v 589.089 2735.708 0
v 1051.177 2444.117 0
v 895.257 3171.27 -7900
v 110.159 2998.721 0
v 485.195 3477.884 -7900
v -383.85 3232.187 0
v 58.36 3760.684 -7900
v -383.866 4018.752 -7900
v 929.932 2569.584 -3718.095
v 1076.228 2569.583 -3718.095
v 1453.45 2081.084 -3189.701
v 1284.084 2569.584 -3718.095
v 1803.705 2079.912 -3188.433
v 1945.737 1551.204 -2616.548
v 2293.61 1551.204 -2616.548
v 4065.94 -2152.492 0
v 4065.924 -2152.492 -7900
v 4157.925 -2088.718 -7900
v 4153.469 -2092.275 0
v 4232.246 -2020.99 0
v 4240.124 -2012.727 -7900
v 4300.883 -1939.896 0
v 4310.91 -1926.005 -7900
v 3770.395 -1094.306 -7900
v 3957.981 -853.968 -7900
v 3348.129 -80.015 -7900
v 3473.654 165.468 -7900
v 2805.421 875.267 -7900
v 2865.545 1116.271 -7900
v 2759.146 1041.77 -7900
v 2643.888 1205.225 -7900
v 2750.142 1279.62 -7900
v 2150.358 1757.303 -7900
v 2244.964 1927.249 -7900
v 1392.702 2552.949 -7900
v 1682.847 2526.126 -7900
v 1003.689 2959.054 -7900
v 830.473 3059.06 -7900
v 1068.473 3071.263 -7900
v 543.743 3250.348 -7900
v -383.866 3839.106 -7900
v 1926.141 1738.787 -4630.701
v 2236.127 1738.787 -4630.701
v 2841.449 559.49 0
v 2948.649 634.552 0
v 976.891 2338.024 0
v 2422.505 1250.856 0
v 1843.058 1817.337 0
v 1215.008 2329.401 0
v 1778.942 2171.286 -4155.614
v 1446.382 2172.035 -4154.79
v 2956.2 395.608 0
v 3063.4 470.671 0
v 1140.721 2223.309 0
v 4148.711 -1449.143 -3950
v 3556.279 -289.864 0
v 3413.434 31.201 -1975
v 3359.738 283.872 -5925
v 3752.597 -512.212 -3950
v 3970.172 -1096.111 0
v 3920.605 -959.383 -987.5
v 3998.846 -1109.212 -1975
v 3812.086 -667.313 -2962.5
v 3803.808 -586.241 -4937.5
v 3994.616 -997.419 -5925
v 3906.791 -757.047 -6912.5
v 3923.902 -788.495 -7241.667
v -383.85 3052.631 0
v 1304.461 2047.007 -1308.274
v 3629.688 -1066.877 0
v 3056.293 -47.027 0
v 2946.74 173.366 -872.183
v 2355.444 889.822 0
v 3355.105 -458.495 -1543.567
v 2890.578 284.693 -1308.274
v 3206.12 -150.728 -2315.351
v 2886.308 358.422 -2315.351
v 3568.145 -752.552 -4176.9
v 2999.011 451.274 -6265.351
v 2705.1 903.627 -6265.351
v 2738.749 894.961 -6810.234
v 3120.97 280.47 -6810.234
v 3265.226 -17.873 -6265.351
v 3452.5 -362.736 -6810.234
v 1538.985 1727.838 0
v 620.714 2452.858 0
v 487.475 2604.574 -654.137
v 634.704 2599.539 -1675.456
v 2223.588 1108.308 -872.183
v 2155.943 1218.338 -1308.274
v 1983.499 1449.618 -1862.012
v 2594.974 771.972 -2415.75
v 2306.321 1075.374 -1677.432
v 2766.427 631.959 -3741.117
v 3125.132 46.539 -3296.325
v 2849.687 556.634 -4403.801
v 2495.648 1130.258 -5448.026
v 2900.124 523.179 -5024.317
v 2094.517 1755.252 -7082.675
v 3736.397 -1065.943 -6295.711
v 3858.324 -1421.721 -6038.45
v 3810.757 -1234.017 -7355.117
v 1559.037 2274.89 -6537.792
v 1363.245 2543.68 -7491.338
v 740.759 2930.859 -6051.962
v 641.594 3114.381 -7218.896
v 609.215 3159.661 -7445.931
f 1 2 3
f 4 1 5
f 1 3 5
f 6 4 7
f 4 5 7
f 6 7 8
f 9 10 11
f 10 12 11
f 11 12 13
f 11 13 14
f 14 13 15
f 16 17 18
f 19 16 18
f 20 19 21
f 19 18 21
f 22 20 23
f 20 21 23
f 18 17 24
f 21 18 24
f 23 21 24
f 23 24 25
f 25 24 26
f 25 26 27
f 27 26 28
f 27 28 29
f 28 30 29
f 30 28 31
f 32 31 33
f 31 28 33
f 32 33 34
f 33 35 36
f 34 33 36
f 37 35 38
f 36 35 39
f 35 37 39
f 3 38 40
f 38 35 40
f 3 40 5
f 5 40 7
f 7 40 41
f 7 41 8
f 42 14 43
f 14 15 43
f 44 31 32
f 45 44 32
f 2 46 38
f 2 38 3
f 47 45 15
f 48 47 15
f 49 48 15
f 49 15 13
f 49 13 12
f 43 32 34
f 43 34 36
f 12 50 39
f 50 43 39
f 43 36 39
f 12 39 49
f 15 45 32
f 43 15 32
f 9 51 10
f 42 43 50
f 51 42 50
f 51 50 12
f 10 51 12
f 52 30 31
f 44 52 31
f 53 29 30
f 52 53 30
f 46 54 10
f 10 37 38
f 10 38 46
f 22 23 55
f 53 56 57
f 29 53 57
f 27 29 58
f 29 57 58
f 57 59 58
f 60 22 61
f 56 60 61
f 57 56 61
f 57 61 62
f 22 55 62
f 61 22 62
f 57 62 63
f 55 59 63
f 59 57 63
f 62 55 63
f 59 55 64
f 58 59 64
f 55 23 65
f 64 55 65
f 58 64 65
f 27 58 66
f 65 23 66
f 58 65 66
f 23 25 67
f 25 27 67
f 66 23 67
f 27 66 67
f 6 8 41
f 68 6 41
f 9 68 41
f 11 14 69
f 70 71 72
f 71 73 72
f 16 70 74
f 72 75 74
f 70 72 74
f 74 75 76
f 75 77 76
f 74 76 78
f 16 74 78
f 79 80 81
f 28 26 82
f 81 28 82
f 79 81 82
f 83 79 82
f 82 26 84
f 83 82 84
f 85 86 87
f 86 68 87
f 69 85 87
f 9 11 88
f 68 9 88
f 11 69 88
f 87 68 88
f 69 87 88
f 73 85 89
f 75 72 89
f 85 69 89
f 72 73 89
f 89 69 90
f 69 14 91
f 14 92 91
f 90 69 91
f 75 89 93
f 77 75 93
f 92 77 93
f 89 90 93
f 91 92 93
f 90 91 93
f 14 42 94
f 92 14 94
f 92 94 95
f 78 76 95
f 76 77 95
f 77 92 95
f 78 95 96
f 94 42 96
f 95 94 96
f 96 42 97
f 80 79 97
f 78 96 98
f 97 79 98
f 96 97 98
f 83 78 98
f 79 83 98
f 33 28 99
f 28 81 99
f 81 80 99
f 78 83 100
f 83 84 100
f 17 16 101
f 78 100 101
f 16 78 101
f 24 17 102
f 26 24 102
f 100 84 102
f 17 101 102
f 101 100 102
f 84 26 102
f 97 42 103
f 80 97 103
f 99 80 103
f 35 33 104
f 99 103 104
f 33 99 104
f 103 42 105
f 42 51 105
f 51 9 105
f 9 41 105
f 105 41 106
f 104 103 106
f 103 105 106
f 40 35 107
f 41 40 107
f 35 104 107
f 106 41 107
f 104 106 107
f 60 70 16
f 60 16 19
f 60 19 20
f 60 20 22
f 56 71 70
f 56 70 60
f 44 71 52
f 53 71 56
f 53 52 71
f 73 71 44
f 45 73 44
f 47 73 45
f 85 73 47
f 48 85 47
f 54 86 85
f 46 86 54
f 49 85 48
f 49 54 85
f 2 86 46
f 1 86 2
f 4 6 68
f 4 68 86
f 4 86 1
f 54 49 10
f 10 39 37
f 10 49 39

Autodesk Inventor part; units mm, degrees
ref_plane "XZ Plane" through (0, 0, 0) normal (0, 1, 0) x (-1, 0, 0)
sketch "Sketch1" plane through (0, 0, 0) normal (0, 0, 1) x (1, 0, 0)
  line L0 (2948.6488, 634.5525) -> (2841.4489, 559.4904)
  line L1 (2841.4489, 559.4904) -> (2956.2003, 395.6085)
  line L2 (2956.2003, 395.6085) -> (3063.4001, 470.6706)
  line L3 (1051.1773, 2444.1167) -> (976.8907, 2338.0244)
  line L4 (976.8907, 2338.0244) -> (1140.7211, 2223.3091)
  line L5 (1140.7211, 2223.3091) -> (1215.0077, 2329.4014)
  line L6 (-383.8501, 3232.1868) -> (-383.8501, 3052.6308)
  arc A0 (4065.9398, -2152.4924) -> (-383.8501, 3052.6308) centre (-4485.4868, -4958.3977) ccw
  arc A1 (1051.1773, 2444.1167) -> (-383.8501, 3232.1868) centre (-3980.604, -5017.8654) ccw
  arc A2 (2948.6488, 634.5525) -> (1215.0077, 2329.4014) centre (-4152.392, -4894.9339) ccw
  arc A3 (4300.883, -1939.8955) -> (3063.4001, 470.6706) centre (-4233.2291, -4798.0297) ccw
  arc A4 (4065.9398, -2152.4924) -> (4300.883, -1939.8955) centre (3657.2708, -1464.7499) ccw
  point P0 (0, 0)
  point P1 (4065.924, -2152.4924)
  point P2 (4065.924, -2152.4924)
  dimension "d8" = 9000
  dimension "d9" = 9000
  dimension "d10" = 9000
  dimension "d11" = 9000
  dimension "d12" = 800
ref_plane "Work Plane2" through (0, 0, -7900) normal (0, 0, 1) x (1, 0, 0)
ref_plane "Work Plane1" through (0, 0, 0) normal (0, 0, 1) x (1, 0, 0)
sketch "Sketch2" plane through (0, 0, -7900) normal (0, 0, 1) x (1, 0, 0)
  arc A0 (895.257, 3171.2695) -> (-383.8658, 4018.7524) centre (-4697.1096, -3880.3569) ccw projected
  line L0 (-383.8658, 4018.7524) -> (-383.8658, 3839.1061) projected
  arc A1 (4065.924, -2152.4924) -> (-383.8658, 3839.1061) centre (-4733.9746, -4039.7614) ccw projected
  line L1 (895.257, 3171.2695) -> (830.4728, 3059.0601) projected
  line L2 (830.4728, 3059.0601) -> (1003.6891, 2959.0536) projected
  line L3 (1068.4733, 3071.2631) -> (1003.6891, 2959.0536) projected
  arc A2 (2750.1419, 1279.62) -> (1068.4733, 3071.2631) centre (-4591.4319, -3926.2703) ccw projected
  line L4 (2750.1419, 1279.62) -> (2643.8882, 1205.2246) projected
  line L5 (2643.8882, 1205.2246) -> (2759.146, 1041.7698) projected
  line L6 (2865.5448, 1116.2711) -> (2759.146, 1041.7698) projected
  arc A3 (4310.9102, -1926.005) -> (2865.5448, 1116.2711) centre (-4397.3898, -4198.7812) ccw projected
  arc A4 (4065.924, -2152.4924) -> (4310.9102, -1926.005) centre (3657.2831, -1464.7333) ccw
  point P0 (0, 0)
  dimension "d7" = 800
loft "Loft1" add profiles "Sketch1", "Sketch2"
ref_plane "Work Plane3" through (2500, 0, 0) normal (1, 0, 0) x (0, 1, 0)
sketch "Sketch3" plane through (2500, 0, 0) normal (1, 0, 0) x (0, 1, 0)
  line L0 (2569.5835, -3718.0946) -> (1551.2045, -2616.5476)
  line L1 (1551.2045, -2616.5476) -> (1738.7871, -4630.7013)
  line L2 (1738.7871, -4630.7013) -> (2569.5835, -3718.0946)
  point P0 (0, 0)
extrude "Extrusion1" cut sketch "Sketch3" against normal through all
properties part number "panel_block_02" material "Wood (Maple)"
